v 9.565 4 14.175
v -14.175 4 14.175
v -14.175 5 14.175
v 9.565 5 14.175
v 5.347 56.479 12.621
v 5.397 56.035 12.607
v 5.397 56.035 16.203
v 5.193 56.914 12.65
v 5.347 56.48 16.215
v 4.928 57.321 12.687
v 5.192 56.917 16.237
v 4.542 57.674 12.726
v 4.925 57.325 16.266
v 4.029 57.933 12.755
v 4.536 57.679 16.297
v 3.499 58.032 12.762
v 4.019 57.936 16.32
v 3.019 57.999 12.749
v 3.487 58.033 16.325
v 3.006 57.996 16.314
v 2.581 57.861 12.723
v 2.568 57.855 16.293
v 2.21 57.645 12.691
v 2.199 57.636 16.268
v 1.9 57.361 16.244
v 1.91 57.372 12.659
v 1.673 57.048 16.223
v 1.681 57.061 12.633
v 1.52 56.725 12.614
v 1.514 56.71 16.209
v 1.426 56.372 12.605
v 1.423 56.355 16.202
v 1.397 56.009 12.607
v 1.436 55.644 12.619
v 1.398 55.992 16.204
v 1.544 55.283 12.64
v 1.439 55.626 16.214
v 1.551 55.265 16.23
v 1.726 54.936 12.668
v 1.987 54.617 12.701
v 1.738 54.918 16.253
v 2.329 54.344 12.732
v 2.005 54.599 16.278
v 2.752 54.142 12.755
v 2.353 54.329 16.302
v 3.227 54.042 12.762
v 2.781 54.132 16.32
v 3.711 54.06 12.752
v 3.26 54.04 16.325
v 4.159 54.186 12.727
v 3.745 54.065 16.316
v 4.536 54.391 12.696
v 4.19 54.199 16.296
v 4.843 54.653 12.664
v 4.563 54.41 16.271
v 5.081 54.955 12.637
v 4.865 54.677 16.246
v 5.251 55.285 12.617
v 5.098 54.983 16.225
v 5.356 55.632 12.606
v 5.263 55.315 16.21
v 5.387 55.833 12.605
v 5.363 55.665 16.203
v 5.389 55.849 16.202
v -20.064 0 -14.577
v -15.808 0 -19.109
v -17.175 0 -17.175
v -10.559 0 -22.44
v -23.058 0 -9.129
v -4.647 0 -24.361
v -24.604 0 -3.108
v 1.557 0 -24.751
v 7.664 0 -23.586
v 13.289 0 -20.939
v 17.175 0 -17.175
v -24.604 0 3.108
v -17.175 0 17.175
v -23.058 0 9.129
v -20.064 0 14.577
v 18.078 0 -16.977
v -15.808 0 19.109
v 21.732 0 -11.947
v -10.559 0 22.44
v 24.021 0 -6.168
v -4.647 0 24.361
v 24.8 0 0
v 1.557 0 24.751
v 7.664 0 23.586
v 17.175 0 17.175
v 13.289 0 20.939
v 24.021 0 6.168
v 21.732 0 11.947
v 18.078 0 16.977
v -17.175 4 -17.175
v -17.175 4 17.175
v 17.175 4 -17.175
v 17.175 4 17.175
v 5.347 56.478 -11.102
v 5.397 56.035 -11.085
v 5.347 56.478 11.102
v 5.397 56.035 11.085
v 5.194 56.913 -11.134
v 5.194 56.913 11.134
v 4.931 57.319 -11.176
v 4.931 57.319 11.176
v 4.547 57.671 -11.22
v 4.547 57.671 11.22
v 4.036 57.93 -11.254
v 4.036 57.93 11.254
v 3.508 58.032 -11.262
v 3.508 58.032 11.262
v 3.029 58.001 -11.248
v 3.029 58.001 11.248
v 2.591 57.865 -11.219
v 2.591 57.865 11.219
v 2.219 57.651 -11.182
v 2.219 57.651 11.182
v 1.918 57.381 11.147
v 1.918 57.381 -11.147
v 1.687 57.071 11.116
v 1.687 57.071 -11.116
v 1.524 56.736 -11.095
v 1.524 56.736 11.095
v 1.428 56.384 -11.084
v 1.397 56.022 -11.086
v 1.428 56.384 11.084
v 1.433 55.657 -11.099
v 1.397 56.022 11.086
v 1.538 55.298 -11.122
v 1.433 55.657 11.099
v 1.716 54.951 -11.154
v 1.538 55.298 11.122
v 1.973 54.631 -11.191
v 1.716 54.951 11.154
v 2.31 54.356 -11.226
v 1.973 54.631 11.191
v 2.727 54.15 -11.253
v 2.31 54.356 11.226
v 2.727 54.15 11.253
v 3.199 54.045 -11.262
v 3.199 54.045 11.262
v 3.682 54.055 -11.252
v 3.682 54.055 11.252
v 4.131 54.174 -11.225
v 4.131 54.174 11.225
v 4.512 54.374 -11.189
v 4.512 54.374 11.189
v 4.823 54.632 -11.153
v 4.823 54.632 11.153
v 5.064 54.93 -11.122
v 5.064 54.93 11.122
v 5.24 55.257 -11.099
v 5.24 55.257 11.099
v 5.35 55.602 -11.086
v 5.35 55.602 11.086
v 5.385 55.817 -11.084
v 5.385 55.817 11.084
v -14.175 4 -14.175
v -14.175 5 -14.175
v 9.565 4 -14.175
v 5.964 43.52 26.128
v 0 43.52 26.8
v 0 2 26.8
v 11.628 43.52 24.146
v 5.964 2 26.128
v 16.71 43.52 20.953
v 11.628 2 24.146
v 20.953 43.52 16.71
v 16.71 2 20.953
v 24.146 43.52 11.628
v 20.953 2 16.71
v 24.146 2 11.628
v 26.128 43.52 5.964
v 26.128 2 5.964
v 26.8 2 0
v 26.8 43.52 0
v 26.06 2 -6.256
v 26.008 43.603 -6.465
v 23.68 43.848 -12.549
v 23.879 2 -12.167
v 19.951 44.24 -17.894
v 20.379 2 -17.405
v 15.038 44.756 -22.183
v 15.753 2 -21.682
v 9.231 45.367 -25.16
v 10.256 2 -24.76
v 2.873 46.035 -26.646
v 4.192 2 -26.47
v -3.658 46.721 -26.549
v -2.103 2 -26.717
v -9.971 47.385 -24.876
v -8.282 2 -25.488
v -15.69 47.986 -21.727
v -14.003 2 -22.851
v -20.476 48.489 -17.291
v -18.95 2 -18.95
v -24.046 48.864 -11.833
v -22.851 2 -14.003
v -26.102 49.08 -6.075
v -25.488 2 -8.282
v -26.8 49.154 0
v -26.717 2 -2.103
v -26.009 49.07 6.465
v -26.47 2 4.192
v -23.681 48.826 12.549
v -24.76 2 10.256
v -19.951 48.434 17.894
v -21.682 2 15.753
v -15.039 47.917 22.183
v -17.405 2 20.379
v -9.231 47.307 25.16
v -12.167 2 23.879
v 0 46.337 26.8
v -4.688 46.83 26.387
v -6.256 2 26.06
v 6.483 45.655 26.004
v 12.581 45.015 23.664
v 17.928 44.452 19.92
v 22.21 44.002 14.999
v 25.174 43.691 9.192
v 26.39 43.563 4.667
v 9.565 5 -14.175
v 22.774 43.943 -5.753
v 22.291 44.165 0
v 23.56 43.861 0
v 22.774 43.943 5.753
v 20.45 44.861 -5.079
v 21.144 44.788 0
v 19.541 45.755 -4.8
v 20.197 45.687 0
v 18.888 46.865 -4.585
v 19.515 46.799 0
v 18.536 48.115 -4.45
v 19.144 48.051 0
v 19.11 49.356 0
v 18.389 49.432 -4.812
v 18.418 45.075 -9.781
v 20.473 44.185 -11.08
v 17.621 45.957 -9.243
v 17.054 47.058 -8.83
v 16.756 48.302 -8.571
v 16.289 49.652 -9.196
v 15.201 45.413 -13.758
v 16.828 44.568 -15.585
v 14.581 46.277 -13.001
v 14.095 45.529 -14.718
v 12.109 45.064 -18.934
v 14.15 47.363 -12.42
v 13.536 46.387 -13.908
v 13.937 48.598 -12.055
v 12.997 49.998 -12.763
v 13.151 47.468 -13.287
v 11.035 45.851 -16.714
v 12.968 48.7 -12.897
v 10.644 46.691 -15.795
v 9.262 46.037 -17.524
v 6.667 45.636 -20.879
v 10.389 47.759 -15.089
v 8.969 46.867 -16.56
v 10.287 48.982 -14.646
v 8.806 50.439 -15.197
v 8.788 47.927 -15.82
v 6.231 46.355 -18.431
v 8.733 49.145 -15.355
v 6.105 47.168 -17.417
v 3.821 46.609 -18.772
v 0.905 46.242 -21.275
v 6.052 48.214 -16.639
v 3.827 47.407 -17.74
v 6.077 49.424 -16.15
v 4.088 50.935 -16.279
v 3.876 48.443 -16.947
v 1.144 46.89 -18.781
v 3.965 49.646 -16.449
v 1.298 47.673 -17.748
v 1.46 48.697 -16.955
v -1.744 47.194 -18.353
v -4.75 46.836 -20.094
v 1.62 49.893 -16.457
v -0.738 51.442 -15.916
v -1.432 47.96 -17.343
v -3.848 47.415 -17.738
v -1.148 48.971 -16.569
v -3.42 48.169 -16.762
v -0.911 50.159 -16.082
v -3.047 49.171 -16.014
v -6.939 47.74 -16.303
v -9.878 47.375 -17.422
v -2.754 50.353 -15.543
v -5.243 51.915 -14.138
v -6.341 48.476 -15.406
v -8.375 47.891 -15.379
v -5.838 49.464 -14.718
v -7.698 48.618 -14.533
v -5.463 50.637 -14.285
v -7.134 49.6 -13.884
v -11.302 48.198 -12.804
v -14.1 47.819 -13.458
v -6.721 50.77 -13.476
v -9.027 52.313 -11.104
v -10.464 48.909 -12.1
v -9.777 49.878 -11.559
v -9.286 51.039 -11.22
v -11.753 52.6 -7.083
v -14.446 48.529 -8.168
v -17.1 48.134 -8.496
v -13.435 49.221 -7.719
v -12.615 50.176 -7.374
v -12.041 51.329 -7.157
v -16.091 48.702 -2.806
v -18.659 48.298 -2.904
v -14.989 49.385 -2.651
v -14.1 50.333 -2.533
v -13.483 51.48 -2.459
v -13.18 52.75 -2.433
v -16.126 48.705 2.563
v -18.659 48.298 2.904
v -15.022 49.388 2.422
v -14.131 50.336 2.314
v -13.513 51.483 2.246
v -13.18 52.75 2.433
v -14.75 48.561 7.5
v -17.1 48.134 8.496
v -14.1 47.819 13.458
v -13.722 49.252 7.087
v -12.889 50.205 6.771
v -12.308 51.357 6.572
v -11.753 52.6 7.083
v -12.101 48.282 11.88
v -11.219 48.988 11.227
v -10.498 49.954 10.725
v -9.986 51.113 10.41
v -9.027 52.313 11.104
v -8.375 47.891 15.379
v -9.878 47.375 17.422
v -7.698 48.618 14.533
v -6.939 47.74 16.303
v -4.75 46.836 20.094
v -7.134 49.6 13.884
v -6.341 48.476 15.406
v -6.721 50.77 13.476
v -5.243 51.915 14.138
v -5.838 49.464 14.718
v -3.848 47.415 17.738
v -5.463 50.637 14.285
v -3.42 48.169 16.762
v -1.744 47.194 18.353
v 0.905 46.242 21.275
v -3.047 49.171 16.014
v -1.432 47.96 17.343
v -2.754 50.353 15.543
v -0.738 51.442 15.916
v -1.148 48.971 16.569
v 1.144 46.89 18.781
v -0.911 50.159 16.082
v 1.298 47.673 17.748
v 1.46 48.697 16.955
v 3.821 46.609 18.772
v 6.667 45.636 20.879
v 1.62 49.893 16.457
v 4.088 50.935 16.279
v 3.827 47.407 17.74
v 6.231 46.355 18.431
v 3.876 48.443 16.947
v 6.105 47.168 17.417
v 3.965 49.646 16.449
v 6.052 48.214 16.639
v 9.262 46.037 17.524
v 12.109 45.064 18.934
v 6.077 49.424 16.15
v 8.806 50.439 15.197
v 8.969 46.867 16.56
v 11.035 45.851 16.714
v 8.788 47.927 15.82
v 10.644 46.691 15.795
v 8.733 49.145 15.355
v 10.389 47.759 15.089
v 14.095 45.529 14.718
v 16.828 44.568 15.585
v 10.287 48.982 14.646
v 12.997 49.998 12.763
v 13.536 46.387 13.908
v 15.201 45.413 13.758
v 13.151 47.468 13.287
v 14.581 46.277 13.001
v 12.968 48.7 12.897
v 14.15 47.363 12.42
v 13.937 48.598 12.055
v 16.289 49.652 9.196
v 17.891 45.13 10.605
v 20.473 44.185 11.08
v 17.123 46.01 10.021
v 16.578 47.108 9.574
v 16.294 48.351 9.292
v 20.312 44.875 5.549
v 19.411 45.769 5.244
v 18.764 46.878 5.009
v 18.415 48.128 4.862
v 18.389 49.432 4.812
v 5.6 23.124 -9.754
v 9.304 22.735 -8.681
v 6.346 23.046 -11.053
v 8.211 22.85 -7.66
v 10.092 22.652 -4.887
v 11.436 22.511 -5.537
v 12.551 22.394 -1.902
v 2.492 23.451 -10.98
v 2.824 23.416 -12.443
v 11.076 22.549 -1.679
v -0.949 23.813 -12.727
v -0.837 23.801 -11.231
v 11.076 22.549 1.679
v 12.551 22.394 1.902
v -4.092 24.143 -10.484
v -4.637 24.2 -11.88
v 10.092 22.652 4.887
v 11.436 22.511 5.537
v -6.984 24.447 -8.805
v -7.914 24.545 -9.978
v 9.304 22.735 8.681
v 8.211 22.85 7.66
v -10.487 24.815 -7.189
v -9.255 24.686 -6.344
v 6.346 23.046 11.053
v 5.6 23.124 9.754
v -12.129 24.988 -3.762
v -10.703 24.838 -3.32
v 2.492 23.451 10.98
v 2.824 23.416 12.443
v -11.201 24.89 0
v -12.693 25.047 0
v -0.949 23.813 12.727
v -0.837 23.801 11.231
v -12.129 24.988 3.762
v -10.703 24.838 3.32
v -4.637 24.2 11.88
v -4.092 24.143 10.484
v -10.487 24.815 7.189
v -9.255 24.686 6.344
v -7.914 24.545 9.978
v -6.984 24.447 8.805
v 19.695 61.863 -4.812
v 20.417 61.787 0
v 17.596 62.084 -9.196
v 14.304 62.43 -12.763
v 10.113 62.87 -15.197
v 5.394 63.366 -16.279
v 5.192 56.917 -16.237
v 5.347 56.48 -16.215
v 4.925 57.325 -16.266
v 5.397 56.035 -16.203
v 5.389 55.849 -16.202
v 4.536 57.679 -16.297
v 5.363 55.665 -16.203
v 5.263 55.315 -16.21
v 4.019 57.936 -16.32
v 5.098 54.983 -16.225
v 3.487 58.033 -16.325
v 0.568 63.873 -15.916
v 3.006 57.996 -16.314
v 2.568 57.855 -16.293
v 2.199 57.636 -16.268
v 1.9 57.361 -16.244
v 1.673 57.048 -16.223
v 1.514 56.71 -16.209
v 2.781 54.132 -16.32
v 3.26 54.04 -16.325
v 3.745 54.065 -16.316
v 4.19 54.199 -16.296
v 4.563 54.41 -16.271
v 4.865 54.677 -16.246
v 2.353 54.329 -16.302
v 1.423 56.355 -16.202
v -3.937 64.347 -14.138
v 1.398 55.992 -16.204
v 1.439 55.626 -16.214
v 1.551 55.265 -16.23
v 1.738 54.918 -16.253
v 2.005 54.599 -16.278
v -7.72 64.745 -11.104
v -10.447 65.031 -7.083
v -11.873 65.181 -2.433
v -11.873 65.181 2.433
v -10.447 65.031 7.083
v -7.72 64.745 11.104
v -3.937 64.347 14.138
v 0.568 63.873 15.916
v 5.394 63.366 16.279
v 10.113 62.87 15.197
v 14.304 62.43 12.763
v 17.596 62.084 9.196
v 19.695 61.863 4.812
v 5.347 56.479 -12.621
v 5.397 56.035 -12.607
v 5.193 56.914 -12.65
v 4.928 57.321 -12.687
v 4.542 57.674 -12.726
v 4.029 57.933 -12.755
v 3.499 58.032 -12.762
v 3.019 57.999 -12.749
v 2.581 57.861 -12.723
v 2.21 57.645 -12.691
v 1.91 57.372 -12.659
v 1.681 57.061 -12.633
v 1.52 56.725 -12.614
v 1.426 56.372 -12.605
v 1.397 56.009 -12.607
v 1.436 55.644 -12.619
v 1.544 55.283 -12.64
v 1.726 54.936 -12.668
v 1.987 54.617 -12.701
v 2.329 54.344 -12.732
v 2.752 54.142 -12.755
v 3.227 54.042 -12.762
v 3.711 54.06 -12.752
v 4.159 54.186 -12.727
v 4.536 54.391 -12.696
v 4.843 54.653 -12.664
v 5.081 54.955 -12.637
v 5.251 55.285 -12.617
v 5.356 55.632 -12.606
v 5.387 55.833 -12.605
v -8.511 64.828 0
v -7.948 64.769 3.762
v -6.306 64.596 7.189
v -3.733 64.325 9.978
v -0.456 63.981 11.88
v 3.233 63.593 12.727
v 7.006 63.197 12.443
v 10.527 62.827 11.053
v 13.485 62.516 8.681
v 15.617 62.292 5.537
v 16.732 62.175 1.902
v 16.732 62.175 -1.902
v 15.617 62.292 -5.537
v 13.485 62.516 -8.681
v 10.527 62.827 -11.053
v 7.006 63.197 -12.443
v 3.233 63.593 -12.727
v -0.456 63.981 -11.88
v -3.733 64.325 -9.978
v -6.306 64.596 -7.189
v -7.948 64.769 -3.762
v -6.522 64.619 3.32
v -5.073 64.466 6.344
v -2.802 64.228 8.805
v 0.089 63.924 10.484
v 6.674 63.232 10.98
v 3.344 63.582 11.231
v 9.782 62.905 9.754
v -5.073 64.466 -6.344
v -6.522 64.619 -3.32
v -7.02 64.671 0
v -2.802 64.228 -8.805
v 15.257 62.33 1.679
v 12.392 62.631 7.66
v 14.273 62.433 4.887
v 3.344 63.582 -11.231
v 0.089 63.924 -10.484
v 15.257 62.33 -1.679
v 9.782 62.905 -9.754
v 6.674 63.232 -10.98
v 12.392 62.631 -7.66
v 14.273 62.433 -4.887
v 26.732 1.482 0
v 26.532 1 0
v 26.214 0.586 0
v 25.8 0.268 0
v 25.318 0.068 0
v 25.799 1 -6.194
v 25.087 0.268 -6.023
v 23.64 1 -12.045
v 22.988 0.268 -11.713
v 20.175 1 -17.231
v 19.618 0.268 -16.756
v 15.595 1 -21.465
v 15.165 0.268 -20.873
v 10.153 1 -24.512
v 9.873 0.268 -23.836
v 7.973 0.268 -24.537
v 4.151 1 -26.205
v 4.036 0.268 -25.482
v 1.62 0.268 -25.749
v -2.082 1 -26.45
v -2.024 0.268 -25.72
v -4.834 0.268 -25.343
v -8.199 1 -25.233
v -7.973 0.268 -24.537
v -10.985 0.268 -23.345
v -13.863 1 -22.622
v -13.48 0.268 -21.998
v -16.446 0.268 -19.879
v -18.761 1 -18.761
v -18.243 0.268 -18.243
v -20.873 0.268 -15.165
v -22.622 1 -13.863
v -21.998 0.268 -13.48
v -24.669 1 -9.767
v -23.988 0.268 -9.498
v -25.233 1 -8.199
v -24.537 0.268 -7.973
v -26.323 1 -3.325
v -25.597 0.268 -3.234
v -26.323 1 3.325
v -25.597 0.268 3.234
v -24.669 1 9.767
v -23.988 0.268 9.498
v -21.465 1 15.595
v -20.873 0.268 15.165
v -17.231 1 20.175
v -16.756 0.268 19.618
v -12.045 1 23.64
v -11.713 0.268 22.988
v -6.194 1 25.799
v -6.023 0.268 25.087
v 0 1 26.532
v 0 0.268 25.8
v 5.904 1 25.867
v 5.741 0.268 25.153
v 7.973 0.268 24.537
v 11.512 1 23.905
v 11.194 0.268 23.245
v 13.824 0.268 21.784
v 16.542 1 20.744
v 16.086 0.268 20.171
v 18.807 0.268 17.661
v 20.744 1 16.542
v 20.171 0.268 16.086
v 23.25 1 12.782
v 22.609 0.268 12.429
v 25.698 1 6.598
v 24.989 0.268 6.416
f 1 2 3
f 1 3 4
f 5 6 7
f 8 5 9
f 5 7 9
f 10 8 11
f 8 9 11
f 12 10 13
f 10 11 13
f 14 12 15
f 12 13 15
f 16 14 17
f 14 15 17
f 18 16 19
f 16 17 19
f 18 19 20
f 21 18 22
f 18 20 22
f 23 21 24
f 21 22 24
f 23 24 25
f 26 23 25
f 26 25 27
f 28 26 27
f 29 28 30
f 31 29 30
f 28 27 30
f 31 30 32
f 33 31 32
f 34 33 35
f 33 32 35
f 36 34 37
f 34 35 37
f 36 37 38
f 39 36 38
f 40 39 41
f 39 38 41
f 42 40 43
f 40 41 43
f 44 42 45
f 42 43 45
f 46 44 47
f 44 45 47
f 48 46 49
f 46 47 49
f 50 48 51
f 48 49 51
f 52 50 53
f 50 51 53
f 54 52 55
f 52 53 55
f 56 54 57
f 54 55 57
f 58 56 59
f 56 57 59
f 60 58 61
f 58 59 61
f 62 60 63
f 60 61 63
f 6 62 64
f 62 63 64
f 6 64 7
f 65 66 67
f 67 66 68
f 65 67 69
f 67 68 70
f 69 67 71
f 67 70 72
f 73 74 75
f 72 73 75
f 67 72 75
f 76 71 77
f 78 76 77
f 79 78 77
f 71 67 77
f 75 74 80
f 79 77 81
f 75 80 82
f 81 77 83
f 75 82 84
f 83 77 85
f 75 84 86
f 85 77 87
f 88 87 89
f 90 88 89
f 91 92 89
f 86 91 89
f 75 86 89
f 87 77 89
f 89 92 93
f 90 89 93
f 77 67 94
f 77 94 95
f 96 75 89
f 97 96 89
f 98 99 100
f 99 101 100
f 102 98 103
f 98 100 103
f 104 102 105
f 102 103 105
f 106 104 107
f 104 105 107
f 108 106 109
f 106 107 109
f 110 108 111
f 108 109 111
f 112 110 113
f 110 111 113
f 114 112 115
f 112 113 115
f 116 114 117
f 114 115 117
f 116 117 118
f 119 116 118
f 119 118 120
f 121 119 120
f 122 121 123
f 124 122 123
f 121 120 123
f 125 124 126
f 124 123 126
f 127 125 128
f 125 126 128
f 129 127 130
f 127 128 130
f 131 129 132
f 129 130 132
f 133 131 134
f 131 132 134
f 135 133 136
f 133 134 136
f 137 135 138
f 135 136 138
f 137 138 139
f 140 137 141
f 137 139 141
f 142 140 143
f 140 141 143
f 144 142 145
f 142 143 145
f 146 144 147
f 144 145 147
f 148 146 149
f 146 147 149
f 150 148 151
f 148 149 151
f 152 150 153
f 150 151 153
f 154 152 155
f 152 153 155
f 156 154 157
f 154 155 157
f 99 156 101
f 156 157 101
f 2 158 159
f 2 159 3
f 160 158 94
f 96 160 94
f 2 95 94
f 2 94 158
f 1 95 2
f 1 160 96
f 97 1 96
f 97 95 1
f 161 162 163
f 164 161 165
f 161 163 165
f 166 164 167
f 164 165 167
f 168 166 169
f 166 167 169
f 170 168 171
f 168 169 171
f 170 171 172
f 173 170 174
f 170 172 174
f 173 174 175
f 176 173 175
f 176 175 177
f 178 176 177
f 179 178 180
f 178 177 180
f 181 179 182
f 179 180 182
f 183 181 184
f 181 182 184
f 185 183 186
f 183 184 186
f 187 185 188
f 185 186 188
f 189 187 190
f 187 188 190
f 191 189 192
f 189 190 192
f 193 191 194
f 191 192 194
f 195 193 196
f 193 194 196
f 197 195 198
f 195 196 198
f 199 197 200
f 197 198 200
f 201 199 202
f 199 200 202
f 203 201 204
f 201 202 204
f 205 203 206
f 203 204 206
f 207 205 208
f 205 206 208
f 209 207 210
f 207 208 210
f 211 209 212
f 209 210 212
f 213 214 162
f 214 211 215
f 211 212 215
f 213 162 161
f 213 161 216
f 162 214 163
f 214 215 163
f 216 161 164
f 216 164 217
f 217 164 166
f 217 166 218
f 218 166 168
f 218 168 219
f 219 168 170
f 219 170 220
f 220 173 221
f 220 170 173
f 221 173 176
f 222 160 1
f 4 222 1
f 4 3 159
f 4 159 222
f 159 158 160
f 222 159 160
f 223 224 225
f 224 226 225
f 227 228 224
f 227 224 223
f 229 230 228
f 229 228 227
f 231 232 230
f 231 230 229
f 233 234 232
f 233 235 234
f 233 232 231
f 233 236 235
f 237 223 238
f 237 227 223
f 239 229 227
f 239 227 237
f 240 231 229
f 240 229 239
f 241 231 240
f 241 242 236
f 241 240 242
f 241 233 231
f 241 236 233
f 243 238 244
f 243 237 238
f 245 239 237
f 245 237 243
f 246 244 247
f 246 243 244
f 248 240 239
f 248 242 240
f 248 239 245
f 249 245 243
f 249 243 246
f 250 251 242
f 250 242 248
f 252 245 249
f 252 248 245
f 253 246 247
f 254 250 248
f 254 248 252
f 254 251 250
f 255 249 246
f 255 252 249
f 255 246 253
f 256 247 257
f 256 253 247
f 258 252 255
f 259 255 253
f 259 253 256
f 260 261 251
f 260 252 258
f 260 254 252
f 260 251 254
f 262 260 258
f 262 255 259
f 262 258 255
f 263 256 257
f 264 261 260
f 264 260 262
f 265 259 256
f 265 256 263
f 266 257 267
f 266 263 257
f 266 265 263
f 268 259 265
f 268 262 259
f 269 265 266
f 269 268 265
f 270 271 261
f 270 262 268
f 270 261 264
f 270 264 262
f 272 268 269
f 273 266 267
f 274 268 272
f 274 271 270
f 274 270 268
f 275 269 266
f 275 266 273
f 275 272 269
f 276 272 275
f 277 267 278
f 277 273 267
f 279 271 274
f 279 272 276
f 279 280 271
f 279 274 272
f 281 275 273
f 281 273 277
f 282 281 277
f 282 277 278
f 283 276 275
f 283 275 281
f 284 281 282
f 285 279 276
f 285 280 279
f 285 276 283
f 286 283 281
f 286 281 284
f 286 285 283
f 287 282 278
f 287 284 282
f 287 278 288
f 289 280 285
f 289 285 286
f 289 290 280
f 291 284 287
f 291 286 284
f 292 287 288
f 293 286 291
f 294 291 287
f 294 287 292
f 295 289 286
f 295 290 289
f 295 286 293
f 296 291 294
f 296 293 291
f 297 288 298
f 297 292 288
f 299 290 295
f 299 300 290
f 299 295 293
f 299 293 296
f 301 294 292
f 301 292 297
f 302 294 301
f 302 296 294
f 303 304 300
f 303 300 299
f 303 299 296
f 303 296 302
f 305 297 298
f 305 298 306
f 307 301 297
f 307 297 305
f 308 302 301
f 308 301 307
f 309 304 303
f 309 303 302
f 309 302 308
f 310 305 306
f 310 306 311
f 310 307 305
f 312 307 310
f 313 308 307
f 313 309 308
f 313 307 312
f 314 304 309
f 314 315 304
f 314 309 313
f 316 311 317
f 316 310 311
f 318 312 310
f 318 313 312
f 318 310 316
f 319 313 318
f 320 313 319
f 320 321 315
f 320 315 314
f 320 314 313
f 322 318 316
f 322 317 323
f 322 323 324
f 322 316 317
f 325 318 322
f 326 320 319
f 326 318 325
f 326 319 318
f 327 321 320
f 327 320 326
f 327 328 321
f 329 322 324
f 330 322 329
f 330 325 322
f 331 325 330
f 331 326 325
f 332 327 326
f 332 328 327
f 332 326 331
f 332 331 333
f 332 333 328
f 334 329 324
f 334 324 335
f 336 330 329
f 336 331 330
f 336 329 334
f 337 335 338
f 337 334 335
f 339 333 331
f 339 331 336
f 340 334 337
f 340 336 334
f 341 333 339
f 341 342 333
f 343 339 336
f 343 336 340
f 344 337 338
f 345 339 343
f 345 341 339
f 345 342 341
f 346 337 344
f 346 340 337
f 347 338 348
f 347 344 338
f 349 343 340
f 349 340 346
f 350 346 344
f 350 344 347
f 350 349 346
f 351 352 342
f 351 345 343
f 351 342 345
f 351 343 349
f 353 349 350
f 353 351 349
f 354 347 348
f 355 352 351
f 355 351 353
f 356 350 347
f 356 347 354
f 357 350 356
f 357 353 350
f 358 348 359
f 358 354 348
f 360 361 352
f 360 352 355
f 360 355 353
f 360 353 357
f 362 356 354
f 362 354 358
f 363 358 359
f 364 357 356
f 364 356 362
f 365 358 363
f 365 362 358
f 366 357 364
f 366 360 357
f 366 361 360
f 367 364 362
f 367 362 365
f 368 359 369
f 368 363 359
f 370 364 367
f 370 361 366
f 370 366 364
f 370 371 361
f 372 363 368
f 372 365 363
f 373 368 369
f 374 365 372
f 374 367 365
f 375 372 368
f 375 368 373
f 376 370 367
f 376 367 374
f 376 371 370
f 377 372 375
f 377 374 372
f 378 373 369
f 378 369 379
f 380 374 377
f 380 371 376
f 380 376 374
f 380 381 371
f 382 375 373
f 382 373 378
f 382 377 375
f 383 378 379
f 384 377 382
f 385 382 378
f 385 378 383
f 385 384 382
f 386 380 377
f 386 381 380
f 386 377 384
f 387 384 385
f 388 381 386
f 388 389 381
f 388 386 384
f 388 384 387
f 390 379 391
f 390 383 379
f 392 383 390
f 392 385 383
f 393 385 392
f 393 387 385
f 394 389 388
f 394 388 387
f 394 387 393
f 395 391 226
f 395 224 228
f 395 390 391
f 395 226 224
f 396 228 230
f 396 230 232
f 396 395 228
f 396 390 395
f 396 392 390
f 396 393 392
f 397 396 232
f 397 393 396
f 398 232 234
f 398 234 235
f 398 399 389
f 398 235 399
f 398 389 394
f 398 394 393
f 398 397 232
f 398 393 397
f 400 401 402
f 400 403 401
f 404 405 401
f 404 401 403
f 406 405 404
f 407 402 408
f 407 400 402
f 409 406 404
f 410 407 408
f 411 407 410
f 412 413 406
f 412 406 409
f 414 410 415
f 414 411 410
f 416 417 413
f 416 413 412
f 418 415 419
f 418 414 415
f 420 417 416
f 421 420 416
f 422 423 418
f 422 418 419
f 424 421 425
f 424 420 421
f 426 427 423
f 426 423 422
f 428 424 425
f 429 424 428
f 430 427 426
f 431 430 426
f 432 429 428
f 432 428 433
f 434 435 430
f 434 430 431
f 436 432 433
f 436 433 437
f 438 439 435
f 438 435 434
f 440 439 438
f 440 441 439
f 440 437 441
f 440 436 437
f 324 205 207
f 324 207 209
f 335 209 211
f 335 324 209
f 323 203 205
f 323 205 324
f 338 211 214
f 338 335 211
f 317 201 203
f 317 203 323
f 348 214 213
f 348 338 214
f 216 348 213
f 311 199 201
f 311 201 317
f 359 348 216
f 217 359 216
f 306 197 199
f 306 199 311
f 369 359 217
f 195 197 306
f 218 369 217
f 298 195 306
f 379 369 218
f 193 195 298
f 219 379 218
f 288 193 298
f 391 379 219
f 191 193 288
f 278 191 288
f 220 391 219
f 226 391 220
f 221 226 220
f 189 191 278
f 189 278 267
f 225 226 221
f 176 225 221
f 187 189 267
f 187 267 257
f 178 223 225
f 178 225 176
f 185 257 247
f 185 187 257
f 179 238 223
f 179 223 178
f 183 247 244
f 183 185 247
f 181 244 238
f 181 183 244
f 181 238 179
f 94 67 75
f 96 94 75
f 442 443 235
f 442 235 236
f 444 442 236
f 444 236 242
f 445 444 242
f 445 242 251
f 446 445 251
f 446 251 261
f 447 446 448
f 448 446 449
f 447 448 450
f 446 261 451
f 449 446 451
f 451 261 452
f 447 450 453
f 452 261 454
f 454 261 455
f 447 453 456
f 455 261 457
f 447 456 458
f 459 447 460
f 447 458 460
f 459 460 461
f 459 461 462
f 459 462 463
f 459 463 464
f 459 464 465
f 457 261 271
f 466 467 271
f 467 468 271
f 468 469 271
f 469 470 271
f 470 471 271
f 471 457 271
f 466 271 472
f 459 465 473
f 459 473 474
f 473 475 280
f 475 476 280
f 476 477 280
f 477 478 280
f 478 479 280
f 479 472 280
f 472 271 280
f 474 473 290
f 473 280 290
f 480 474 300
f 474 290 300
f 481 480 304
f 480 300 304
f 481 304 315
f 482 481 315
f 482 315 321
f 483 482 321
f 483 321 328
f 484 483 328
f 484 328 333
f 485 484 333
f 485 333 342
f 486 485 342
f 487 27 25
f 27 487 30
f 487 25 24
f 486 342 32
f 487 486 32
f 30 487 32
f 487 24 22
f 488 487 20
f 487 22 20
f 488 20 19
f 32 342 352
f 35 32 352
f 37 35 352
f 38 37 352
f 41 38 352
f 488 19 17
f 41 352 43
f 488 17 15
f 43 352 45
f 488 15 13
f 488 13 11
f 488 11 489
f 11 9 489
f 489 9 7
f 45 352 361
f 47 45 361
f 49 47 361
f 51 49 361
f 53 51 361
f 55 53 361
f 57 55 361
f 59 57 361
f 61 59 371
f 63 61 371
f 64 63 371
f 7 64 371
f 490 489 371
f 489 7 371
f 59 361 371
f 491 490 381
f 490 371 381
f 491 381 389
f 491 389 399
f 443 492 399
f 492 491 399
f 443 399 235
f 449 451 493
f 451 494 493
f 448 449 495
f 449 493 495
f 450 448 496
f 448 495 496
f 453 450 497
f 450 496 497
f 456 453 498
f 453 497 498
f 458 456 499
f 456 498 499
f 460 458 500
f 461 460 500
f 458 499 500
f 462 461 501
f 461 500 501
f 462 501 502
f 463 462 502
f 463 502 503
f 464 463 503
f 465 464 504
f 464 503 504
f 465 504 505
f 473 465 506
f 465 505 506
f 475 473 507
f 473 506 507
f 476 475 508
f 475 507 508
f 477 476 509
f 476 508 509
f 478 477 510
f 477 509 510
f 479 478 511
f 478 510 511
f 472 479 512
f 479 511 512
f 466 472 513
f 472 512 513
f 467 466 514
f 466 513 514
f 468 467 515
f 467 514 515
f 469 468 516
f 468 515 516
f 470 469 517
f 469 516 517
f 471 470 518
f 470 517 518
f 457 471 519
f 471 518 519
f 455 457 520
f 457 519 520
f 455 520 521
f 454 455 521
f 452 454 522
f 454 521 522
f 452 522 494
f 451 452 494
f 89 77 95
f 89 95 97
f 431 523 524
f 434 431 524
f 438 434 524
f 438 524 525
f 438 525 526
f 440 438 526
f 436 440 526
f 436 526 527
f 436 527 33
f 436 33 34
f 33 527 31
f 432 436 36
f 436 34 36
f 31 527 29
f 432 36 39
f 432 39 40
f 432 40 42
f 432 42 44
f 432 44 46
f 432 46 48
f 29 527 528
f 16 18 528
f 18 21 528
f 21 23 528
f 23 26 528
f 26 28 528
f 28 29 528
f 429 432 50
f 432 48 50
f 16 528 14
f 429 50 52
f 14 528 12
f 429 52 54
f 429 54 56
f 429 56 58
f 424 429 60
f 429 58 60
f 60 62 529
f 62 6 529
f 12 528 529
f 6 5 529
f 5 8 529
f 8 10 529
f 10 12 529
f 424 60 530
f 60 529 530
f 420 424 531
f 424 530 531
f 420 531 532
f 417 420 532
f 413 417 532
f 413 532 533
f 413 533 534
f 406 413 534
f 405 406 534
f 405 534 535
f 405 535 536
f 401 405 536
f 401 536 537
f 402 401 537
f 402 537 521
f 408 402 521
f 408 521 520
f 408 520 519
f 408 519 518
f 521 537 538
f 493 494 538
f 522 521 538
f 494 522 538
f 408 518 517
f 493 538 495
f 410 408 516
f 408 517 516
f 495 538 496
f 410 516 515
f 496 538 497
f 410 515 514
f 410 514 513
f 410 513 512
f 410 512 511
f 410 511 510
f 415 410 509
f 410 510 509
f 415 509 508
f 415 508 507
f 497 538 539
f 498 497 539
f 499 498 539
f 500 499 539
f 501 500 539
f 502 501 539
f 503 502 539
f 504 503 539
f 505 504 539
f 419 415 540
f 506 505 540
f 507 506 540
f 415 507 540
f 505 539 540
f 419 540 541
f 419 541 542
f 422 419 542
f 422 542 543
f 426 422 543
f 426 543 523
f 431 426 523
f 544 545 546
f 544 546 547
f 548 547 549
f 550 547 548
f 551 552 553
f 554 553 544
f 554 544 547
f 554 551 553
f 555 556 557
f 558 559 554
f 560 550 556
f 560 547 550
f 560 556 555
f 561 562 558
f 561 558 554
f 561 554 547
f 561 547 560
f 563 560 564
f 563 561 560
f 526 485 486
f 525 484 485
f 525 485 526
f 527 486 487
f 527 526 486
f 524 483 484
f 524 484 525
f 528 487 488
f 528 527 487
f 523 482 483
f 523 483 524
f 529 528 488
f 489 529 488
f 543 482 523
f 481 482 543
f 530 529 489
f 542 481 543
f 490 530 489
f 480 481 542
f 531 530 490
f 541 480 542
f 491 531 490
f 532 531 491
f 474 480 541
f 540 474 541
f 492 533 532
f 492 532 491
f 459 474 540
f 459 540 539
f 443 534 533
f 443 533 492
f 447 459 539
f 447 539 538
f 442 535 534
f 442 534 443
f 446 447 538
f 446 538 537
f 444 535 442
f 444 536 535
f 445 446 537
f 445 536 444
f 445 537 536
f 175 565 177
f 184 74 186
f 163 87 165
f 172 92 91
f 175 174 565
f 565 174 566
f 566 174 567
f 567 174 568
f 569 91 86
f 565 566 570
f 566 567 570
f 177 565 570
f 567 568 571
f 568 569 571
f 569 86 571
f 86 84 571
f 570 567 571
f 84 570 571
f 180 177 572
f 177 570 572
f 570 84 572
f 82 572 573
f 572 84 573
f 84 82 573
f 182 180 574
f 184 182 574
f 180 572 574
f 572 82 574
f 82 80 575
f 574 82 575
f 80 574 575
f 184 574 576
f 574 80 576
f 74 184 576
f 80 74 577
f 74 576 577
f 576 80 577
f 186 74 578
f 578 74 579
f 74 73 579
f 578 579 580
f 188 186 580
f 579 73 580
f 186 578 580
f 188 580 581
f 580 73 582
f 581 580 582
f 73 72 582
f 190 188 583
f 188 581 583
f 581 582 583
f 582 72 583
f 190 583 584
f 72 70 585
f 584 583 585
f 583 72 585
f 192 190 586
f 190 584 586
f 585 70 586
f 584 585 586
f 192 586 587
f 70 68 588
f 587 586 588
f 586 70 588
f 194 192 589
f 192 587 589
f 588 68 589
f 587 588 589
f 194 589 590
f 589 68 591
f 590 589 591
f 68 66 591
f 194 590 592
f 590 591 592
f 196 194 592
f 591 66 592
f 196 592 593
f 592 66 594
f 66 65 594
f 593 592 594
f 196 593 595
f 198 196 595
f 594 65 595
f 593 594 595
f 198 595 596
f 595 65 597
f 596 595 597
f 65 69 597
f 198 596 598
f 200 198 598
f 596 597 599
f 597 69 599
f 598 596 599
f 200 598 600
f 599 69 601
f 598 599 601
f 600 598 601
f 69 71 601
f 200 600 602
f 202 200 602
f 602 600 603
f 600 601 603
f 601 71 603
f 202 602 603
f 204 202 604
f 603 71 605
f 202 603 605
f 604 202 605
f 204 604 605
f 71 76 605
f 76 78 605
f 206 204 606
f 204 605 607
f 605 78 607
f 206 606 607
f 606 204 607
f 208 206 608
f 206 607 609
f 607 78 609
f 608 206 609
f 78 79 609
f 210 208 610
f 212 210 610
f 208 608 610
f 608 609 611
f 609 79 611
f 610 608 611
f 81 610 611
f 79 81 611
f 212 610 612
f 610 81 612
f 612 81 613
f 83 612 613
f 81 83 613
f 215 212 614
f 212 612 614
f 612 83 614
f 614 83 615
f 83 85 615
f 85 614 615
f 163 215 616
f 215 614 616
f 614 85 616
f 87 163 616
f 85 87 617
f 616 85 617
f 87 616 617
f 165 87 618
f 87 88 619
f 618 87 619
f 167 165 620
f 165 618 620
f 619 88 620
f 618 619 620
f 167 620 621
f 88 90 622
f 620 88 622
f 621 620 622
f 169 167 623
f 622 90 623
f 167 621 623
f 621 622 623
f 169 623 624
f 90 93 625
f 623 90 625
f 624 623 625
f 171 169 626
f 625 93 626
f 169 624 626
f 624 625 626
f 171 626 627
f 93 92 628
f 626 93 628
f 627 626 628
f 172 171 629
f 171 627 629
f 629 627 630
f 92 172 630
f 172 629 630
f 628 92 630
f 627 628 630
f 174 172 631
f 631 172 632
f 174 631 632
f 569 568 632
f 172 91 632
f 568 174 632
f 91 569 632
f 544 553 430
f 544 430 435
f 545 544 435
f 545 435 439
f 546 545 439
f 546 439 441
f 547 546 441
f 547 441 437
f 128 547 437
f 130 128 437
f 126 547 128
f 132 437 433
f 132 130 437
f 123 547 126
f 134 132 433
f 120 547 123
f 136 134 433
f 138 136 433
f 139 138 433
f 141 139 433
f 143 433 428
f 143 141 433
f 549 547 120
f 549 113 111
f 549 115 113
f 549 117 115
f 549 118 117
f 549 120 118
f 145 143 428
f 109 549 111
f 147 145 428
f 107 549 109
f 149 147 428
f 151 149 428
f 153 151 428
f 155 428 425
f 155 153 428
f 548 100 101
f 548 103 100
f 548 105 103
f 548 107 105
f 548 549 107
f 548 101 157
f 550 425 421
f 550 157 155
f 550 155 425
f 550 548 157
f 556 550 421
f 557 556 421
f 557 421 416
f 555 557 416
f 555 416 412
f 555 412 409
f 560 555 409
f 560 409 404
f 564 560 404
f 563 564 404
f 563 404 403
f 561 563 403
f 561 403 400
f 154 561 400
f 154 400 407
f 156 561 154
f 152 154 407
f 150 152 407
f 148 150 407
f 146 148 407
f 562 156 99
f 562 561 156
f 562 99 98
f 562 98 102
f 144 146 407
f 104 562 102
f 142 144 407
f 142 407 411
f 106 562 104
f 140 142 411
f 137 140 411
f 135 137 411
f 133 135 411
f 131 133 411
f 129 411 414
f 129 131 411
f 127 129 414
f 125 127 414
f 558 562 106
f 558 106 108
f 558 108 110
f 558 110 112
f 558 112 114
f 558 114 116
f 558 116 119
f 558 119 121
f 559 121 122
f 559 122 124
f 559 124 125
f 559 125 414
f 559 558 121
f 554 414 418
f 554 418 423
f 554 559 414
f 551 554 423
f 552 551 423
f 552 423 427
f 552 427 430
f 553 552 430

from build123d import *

# Parameters (mm, degrees)
SKETCH1_R                  = 26.8
MAIN_BODY_EXTRUDE_DEPTH    = 43.52
ANGLED_EXTRUDE_OUTLINE_R   = 26.8
ANGLED_EXTRUDE_DEPTH       = 5.63358701
ANGLED_START               = 46.082955702
ANGLED_EXTRUDE_2_OUTLINE_W = 57
ANGLED_EXTRUDE_2_OUTLINE_H = 56
ANGLED_EXTRUDE_2_DEPTH     = 6.917044298
SKETCH8_R                  = 16.325
ATTACHMENT_EXTRUDE_DEPTH   = 22.5
SKETCH11_R                 = 12.7625
SKETCH11_R_2               = 11.2625
TUBING_HOLE_DEPTH          = 45
SKETCH13_R                 = 2
BOLT_HOLE_DEPTH            = 25
SKETCH14_W                 = 34.35
SKETCH14_H                 = 34.35
CUT_EXTRUDE3_DEPTH         = 4
SKETCH16_W                 = 23.74
SKETCH16_H                 = 28.35
CUT_EXTRUDE5_DEPTH         = 1
FILLET3_R                  = 5
SKETCH18_R                 = 16.824719049
CUT_EXTRUDE6_DEPTH         = 5


with BuildPart() as part:
    # Sketch1 → Main Body Extrude (new body)
    with BuildSketch(Plane(origin=(0, 0, 0), x_dir=(1, 0, 0), z_dir=(0, 1, 0))):
        with Locations(Location((0, 0, 0), (0, 0, 270))):
            Circle(SKETCH1_R)
    extrude(amount=MAIN_BODY_EXTRUDE_DEPTH)

    # Angled Extrude: read off the stored shape, not the designer's step
    # Angled Extrude outline → Angled Extrude (add)
    with BuildSketch(Plane(origin=(0, 43.52, 0), x_dir=(1, 0, 0), z_dir=(0, 1, 0))):
        Circle(ANGLED_EXTRUDE_OUTLINE_R)
    extrude(amount=ANGLED_EXTRUDE_DEPTH)

    # Angled Extrude 2 outline → Angled Extrude 2 (cut)
    with BuildSketch(Plane(origin=(0, 0, 0), x_dir=(0.9945218953682733, -0.10452846326765303, 0), z_dir=(0.10452846326765304, 0.9945218953682734, 0)).offset(ANGLED_START)):
        with Locations((-4.5, 0)):
            Rectangle(ANGLED_EXTRUDE_2_OUTLINE_W, ANGLED_EXTRUDE_2_OUTLINE_H)
    extrude(amount=ANGLED_EXTRUDE_2_DEPTH, mode=Mode.SUBTRACT)

    # Sketch8 → Attachment Extrude (add)
    with BuildSketch(Plane(origin=(4.816980542, 45.830508449, 0), x_dir=(0.9945218953682734, -0.10452846326765328, 0), z_dir=(0.10452846326765328, 0.9945218953682734, 0))):
        with Locations((-2.478668524, 0)):
            Circle(SKETCH8_R)
    extrude(amount=ATTACHMENT_EXTRUDE_DEPTH)

    # Sketch11 → Tubing Hole (cut)
    with BuildSketch(Plane(origin=(7.168870966, 68.207251095, 0), x_dir=(0.9945218953682734, -0.10452846326765329, 0), z_dir=(0.10452846326765329, 0.9945218953682734, 0))):
        with Locations(Location((-2.478668524, 0, 0), (0, 0, 180))):
            Circle(SKETCH11_R)
        with Locations(Location((-2.478668524, 0, 0), (0, 0, 180))):
            Circle(SKETCH11_R_2, mode=Mode.SUBTRACT)
    extrude(amount=-TUBING_HOLE_DEPTH, mode=Mode.SUBTRACT)

    # Sketch13 → Bolt Hole (cut, symmetric)
    with BuildSketch(Plane.XY):
        with Locations((3.397175056, 56.034818814)):
            Circle(SKETCH13_R)
    extrude(amount=BOLT_HOLE_DEPTH, both=True, mode=Mode.SUBTRACT)

    # Sketch14 → Cut-Extrude3 (cut)
    with BuildSketch(Plane.XZ):
        Rectangle(SKETCH14_W, SKETCH14_H)
    extrude(amount=-CUT_EXTRUDE3_DEPTH, mode=Mode.SUBTRACT)

    # Sketch16 → Cut-Extrude5 (cut)
    with BuildSketch(Plane.XZ.offset(-4)):
        with Locations((-2.305, 0)):
            Rectangle(SKETCH16_W, SKETCH16_H)
    extrude(amount=-CUT_EXTRUDE5_DEPTH, mode=Mode.SUBTRACT)

    # Fillet1: read off the stored shape, not the designer's step
    # Fillet1 outline → Fillet1 (revolve, cut)
    with BuildSketch(Plane.XY):
        with BuildLine():
            ThreePointArc((26.8, 2), (26.214213562, 0.585786438), (24.8, 0))
            Line((24.8, 0), (26.8, 0))
            Line((26.8, 0), (26.8, 2))
        make_face()
    revolve(axis=Axis((0, 0, 0), (0, 1, 0)), mode=Mode.SUBTRACT)

    # Fillet3
    fillet3_edges = [part.edges().sort_by_distance(p)[0] for p in [
        (-13.883679518, 47.796027024, 0),
    ]]
    fillet(fillet3_edges, radius=FILLET3_R)

    # Sketch18 → Cut-Extrude6 (cut)
    with BuildSketch(Plane(origin=(7.168870966, 68.207251095, 0), x_dir=(0.9945218953682734, -0.10452846326765328, 0), z_dir=(0.10452846326765328, 0.9945218953682734, 0))):
        with Locations((-2.478668524, 0)):
            Circle(SKETCH18_R)
    extrude(amount=-CUT_EXTRUDE6_DEPTH, mode=Mode.SUBTRACT)


solid = part.part
